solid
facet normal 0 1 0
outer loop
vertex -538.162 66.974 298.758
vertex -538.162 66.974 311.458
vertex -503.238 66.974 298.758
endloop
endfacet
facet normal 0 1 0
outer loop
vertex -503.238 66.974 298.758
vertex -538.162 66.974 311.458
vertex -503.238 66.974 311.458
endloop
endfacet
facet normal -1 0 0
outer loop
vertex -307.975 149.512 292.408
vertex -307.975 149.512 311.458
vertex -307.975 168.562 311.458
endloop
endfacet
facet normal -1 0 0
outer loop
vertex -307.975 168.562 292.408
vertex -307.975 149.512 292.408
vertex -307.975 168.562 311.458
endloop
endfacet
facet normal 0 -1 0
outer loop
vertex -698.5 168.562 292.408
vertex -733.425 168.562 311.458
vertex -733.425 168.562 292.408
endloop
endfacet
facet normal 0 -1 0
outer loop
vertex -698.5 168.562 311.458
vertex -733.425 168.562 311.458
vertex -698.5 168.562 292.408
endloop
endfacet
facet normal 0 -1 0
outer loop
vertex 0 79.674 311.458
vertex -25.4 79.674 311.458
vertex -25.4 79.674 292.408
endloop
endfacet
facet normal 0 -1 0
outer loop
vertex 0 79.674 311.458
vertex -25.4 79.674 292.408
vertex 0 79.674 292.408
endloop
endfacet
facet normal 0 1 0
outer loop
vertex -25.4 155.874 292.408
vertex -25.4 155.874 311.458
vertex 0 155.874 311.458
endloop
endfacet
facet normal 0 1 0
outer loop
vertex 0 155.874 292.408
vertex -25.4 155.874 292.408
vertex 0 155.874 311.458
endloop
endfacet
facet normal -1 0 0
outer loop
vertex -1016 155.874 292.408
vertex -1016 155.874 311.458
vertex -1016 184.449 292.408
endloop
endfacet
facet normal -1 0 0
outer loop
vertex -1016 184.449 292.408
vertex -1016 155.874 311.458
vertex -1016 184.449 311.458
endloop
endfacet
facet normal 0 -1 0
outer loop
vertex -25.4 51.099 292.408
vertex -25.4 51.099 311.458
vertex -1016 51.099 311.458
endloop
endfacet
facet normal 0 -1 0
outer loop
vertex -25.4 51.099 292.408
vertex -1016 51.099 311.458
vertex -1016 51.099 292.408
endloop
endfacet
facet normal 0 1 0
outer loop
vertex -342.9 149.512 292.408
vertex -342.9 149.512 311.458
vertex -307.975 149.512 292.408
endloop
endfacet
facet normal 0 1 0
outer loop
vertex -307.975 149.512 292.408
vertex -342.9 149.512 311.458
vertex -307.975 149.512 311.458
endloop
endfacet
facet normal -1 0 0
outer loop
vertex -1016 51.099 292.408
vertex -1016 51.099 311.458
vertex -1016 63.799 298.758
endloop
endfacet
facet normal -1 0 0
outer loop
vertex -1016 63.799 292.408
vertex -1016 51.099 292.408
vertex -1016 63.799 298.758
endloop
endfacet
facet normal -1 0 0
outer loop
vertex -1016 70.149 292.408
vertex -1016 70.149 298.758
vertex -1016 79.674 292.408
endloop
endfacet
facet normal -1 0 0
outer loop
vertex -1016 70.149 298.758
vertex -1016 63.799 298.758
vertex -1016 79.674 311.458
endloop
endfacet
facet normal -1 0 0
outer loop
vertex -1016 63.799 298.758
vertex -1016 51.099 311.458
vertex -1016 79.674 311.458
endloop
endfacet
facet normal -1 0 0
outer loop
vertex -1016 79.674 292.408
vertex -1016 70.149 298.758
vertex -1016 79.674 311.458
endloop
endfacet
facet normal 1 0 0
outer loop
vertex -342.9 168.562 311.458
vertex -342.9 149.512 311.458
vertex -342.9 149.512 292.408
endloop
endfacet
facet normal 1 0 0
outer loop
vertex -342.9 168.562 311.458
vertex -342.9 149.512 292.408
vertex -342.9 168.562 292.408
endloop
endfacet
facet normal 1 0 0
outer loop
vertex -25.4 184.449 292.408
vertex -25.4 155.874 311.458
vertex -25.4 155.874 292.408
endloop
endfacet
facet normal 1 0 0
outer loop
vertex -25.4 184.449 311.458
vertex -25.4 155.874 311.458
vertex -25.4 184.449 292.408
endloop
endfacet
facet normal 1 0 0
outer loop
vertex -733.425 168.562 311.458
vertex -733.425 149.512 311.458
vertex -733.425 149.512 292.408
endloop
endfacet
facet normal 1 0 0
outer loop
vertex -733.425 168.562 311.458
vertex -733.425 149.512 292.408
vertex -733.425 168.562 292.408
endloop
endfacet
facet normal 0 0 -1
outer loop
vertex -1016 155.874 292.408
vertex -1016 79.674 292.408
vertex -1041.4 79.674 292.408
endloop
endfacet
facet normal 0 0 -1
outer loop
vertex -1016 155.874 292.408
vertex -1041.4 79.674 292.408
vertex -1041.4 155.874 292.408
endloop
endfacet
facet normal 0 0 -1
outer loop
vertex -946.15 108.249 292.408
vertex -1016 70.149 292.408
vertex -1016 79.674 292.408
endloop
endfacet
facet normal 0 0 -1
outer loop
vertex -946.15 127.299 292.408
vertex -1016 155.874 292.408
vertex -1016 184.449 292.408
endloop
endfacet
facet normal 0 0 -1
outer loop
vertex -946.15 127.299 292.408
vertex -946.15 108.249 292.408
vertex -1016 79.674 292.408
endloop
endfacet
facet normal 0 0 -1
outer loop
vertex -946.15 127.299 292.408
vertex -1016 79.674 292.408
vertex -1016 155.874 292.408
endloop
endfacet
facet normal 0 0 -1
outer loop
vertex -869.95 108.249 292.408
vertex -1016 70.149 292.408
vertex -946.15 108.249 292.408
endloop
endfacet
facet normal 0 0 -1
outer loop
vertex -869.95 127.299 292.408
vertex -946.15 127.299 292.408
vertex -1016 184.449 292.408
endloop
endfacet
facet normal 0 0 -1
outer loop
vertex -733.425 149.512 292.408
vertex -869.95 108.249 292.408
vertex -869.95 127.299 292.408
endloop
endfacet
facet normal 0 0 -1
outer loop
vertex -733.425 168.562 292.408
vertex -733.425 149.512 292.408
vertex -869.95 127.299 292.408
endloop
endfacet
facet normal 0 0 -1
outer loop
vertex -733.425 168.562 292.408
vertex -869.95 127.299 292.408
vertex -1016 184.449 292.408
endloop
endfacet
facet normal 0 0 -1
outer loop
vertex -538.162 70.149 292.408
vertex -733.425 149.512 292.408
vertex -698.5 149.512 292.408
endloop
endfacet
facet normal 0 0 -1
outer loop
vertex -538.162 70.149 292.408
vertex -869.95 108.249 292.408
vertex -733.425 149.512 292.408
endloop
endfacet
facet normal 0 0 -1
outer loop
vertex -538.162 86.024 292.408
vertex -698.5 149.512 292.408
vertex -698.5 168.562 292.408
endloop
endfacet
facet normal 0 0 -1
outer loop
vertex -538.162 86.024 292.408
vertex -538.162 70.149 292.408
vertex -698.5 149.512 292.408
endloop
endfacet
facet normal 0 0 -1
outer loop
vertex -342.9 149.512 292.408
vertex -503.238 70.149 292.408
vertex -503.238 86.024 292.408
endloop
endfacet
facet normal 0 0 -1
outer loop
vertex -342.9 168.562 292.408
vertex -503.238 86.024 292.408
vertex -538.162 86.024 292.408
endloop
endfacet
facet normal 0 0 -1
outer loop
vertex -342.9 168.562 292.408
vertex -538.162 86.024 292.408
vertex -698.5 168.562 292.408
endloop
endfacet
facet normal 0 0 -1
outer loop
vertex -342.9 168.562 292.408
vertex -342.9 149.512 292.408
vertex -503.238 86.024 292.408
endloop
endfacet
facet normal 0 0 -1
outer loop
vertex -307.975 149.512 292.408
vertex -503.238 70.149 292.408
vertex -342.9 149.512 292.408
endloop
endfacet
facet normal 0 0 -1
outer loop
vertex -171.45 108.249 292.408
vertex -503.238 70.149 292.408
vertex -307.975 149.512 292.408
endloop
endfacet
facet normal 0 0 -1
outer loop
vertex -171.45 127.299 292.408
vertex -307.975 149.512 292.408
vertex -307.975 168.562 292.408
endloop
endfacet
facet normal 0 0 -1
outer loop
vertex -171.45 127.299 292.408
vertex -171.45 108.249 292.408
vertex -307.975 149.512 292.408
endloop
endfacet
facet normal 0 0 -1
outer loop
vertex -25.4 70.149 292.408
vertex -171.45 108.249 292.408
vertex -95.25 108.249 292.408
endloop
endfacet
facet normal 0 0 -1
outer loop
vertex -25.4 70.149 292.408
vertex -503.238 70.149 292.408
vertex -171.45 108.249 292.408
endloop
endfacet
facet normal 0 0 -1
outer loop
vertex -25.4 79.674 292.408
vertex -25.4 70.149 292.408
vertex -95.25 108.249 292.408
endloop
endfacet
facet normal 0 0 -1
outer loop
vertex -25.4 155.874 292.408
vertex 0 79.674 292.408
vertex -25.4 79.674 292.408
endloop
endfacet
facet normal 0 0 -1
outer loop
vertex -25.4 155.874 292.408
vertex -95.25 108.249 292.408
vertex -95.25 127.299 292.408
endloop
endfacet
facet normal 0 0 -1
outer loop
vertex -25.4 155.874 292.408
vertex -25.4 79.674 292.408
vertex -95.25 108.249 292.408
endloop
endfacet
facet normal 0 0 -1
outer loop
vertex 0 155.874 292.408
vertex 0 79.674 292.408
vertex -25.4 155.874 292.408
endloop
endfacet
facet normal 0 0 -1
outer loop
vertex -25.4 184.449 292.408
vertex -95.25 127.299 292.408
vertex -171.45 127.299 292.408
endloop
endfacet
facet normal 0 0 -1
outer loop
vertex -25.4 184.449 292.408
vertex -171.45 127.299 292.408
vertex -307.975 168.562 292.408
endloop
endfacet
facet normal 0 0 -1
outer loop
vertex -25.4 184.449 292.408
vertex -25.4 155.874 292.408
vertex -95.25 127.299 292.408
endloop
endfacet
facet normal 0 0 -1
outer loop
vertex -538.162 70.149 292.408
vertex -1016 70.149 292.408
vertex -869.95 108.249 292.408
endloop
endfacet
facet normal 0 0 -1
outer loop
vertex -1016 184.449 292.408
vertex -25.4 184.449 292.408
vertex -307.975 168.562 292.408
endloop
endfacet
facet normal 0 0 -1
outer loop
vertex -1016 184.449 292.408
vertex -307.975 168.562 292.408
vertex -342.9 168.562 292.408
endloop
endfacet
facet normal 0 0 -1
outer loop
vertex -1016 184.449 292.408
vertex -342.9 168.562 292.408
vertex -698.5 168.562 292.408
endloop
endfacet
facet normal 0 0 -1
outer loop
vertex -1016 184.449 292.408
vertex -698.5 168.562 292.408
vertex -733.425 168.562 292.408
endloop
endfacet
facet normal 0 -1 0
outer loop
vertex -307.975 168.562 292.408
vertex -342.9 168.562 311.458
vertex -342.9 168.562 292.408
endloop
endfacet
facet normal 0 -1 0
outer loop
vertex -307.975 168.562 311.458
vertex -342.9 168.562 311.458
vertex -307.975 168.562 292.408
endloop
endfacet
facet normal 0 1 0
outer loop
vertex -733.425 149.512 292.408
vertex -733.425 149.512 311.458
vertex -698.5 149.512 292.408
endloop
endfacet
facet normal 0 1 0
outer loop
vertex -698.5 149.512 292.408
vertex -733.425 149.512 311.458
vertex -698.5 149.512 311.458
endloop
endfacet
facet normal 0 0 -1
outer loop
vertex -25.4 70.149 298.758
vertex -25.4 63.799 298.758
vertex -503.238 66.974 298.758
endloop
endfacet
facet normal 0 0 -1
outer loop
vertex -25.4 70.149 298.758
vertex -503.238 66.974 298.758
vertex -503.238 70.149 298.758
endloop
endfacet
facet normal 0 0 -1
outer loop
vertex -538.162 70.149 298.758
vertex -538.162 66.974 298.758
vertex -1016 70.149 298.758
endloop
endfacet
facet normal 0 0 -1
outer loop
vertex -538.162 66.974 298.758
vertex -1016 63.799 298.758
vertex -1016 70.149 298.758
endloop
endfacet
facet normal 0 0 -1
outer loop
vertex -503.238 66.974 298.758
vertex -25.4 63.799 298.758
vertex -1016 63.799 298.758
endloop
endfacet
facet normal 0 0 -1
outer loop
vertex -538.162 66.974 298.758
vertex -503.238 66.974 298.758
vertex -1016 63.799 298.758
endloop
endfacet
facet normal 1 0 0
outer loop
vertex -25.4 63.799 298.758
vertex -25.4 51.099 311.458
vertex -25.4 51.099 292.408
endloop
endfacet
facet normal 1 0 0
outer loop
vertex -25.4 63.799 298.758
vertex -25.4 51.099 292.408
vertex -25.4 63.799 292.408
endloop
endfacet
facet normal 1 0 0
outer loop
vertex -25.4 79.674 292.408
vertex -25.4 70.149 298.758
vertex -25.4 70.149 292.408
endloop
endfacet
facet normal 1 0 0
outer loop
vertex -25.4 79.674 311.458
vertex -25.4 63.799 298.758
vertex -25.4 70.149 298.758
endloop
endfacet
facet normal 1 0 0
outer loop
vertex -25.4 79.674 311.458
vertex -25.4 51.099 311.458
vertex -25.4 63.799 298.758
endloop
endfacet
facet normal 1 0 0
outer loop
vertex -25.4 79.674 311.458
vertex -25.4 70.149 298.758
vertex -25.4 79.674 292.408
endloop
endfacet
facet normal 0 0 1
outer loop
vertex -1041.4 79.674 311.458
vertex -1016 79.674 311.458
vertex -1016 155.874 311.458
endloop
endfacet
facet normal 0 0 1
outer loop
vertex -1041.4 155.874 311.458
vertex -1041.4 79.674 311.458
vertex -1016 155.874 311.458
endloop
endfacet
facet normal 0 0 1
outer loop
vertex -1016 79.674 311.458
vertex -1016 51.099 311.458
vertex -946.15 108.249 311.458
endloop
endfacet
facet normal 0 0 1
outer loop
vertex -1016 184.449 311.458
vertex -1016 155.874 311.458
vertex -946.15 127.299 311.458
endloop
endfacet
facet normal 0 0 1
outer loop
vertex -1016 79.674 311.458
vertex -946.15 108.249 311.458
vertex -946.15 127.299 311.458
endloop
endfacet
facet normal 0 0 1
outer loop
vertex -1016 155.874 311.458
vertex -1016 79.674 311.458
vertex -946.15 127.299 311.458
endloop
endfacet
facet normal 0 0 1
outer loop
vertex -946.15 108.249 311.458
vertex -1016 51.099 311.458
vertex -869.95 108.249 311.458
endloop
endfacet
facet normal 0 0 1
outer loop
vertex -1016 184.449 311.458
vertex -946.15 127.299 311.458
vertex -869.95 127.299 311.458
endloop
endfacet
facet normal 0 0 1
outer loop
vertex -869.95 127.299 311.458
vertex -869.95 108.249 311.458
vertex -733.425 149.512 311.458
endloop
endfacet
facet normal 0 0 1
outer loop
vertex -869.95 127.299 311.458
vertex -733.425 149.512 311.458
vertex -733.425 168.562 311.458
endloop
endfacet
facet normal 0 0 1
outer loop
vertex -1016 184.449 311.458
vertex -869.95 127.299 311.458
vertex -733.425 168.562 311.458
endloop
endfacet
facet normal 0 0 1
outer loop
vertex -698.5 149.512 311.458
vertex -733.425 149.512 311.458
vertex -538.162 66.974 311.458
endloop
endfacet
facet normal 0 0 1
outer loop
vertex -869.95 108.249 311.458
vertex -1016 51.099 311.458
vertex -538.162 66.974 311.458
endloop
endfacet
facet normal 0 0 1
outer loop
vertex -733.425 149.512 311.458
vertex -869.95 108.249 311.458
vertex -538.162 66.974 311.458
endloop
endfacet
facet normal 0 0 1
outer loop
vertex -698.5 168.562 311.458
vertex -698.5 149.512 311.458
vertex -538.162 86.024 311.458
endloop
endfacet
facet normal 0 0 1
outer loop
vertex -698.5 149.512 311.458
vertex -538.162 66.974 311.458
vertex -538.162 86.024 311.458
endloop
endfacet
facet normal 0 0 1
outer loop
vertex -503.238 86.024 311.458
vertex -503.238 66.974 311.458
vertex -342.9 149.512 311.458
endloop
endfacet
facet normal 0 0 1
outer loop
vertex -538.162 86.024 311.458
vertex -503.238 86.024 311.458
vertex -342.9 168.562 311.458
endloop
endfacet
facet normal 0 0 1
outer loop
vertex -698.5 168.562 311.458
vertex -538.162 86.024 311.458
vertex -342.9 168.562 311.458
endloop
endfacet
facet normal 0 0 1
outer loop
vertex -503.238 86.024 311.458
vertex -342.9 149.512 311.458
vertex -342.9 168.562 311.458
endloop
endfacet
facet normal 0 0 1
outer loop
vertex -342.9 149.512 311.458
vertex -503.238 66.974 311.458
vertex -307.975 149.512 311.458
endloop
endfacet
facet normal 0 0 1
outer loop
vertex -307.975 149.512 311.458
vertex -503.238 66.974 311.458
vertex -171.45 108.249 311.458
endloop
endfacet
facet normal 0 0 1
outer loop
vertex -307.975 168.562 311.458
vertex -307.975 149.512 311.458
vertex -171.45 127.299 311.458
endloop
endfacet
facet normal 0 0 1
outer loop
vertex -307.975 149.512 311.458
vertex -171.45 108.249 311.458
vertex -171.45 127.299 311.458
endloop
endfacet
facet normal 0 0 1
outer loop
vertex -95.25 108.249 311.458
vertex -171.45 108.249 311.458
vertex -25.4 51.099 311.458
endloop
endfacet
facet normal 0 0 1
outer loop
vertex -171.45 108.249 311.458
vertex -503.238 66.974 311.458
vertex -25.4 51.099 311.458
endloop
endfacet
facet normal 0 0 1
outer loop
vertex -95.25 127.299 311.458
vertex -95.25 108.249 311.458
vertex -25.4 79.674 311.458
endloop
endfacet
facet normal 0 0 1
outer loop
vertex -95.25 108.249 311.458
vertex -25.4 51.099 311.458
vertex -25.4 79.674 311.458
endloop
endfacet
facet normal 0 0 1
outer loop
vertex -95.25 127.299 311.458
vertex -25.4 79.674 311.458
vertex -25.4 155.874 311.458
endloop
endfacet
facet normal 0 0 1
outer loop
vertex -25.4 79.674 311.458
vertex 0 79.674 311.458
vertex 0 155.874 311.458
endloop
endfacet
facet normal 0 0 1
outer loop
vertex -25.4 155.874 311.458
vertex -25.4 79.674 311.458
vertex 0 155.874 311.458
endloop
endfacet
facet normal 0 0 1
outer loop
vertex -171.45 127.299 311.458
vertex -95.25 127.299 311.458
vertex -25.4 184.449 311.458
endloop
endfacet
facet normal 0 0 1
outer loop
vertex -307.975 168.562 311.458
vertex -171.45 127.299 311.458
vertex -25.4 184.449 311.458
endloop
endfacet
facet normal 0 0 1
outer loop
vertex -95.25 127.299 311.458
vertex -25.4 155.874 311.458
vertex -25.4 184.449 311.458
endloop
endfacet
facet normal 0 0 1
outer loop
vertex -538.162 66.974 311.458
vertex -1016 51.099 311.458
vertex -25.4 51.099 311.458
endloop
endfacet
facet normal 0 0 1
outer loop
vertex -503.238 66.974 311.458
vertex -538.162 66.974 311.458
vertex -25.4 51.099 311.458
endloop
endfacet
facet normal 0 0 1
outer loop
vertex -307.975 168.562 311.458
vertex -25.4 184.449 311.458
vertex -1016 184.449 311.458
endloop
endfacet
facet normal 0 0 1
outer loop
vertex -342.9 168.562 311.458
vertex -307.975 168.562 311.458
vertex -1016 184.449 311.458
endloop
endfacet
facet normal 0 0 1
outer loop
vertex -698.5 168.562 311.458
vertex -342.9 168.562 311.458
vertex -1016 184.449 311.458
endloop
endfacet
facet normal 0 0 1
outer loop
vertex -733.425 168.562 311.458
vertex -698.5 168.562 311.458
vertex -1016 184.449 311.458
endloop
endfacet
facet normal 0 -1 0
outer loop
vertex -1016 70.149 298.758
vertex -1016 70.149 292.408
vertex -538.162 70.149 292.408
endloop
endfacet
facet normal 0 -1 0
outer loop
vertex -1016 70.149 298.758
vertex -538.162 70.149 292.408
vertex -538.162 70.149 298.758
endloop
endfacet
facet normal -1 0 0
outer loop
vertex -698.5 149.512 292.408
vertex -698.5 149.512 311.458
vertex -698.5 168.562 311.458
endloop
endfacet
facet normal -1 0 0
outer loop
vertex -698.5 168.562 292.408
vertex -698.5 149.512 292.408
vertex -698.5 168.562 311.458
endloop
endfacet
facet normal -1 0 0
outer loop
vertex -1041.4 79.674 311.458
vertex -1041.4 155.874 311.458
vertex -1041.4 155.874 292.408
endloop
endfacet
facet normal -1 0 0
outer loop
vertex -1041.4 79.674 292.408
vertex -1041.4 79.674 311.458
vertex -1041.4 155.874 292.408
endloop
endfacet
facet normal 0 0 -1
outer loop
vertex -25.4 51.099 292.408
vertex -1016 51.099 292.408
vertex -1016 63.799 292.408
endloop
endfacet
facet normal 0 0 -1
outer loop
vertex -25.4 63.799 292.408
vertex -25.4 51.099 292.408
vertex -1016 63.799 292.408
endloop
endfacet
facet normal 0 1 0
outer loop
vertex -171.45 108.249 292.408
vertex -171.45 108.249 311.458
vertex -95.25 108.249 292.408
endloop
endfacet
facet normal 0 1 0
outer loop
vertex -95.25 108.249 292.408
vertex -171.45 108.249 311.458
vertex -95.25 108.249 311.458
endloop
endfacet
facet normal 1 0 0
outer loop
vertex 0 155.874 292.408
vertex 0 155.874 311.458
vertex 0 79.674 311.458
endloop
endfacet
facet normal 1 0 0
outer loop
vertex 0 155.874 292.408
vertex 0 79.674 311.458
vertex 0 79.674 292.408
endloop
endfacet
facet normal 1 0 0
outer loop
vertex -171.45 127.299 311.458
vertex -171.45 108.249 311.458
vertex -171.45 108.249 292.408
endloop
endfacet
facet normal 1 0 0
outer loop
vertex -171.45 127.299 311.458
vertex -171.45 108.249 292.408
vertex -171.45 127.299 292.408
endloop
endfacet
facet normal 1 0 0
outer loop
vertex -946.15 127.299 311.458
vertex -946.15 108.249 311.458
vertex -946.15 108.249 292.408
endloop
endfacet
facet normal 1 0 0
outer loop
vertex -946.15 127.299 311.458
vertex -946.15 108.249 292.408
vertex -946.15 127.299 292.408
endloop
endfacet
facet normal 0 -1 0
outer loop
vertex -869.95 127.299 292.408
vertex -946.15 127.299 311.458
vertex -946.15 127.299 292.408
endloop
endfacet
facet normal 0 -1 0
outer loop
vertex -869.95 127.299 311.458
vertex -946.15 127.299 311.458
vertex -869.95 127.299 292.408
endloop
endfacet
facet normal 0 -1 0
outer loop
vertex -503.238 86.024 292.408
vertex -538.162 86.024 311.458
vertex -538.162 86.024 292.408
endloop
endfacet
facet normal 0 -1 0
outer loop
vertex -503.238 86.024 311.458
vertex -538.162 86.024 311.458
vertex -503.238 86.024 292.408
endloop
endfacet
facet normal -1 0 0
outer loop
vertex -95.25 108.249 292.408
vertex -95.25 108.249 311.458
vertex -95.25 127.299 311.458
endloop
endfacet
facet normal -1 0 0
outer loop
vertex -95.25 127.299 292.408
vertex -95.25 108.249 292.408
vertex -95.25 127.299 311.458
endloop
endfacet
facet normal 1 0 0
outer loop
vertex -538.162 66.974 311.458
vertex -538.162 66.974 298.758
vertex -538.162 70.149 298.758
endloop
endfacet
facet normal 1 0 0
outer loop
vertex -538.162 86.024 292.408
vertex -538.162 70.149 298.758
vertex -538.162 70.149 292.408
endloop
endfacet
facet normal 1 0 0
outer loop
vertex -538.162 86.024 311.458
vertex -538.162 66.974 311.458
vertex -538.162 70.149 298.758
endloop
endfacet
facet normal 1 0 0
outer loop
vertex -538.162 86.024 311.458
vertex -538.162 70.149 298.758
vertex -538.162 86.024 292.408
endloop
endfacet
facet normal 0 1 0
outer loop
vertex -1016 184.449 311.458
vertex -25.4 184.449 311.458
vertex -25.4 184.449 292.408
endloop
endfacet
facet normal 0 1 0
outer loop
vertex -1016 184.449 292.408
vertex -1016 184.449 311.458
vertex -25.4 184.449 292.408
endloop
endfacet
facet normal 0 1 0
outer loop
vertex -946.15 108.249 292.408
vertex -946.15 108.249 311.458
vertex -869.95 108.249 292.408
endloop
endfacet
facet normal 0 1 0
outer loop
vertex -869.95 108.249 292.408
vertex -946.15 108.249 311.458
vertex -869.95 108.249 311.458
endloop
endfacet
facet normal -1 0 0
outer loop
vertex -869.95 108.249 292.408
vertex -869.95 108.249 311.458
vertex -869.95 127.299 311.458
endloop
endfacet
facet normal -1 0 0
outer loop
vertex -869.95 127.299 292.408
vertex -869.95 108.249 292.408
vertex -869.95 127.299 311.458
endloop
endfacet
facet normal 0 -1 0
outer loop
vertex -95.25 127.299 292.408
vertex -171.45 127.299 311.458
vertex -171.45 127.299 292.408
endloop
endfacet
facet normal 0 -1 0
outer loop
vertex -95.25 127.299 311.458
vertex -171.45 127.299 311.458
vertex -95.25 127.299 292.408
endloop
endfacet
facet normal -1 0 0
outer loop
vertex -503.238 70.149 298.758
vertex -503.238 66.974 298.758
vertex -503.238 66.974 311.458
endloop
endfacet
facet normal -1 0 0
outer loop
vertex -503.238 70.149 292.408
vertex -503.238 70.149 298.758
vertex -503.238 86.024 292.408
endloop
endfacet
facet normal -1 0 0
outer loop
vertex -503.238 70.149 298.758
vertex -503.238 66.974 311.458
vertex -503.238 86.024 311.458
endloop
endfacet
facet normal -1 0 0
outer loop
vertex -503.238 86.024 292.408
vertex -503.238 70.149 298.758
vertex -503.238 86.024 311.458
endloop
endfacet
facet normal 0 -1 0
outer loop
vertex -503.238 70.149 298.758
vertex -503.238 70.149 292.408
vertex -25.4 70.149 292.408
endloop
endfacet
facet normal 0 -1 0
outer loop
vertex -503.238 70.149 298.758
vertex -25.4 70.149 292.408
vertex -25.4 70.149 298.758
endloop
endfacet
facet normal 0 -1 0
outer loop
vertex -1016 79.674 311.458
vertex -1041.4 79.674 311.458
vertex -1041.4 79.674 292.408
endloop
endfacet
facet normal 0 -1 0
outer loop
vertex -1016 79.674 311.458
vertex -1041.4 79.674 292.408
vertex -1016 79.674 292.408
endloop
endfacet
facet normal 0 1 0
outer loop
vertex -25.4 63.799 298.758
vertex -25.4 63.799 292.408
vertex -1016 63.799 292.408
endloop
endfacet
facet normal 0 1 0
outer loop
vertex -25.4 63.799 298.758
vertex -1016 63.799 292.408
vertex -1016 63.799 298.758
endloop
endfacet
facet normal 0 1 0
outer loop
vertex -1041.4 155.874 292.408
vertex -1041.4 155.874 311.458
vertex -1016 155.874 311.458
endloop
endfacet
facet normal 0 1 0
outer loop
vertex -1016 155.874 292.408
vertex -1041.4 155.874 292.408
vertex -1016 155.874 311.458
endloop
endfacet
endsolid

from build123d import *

# Parameters (mm, degrees)
SKETCH1_W           = 19.05
SKETCH1_H           = 133.35
BOSS_EXTRUDE1_DEPTH = 1041.4
SKETCH2_W           = 76.2
SKETCH2_H           = 19.05
SKETCH2_W_2         = 34.925
SKETCH2_W_3         = 25.4
SKETCH2_H_2         = 28.575
CUT_EXTRUDE1_DEPTH  = 1058.779929099
SKETCH3_W           = 6.35
SKETCH3_H           = 6.35
CUT_EXTRUDE2_DEPTH  = 1103.515918102


with BuildPart() as part:
    # Sketch1 → Boss-Extrude1 (new body)
    with BuildSketch(Plane(origin=(0, 0, 0), x_dir=(0, 0, -1), z_dir=(1, 0, 0))):
        with Locations((-301.932659665, 117.774223108)):
            Rectangle(SKETCH1_W, SKETCH1_H)
    extrude(amount=-BOSS_EXTRUDE1_DEPTH)

    # Sketch2 → Cut-Extrude1 (cut, through all)
    with BuildSketch(Plane.XY.offset(311.457659665)):
        with Locations((-908.05, 117.774223108)):
            Rectangle(SKETCH2_W, SKETCH2_H)
        with Locations((-133.35, 117.774223108)):
            Rectangle(SKETCH2_W, SKETCH2_H)
        with Locations((-325.4375, 159.036523108)):
            Rectangle(SKETCH2_W_2, SKETCH2_H)
        with Locations((-715.9625, 159.036523108)):
            Rectangle(SKETCH2_W_2, SKETCH2_H)
        with Locations((-12.7, 170.161723108)):
            Rectangle(SKETCH2_W_3, SKETCH2_H_2)
        with Locations((-1028.7, 170.161723108)):
            Rectangle(SKETCH2_W_3, SKETCH2_H_2)
        with Locations((-520.7, 76.499223108)):
            Rectangle(SKETCH2_W_2, SKETCH2_H)
        with Locations((-1028.7, 65.386723108)):
            Rectangle(SKETCH2_W_3, SKETCH2_H_2)
        with Locations((-12.7, 65.386723108)):
            Rectangle(SKETCH2_W_3, SKETCH2_H_2)
    extrude(amount=-CUT_EXTRUDE1_DEPTH, mode=Mode.SUBTRACT)

    # Sketch3 → Cut-Extrude2 (cut, through all)
    with BuildSketch(Plane.ZY.offset(1041.4)):
        with Locations((295.582659665, 66.974223108)):
            Rectangle(SKETCH3_W, SKETCH3_H)
    extrude(amount=-CUT_EXTRUDE2_DEPTH, mode=Mode.SUBTRACT)


solid = part.part
